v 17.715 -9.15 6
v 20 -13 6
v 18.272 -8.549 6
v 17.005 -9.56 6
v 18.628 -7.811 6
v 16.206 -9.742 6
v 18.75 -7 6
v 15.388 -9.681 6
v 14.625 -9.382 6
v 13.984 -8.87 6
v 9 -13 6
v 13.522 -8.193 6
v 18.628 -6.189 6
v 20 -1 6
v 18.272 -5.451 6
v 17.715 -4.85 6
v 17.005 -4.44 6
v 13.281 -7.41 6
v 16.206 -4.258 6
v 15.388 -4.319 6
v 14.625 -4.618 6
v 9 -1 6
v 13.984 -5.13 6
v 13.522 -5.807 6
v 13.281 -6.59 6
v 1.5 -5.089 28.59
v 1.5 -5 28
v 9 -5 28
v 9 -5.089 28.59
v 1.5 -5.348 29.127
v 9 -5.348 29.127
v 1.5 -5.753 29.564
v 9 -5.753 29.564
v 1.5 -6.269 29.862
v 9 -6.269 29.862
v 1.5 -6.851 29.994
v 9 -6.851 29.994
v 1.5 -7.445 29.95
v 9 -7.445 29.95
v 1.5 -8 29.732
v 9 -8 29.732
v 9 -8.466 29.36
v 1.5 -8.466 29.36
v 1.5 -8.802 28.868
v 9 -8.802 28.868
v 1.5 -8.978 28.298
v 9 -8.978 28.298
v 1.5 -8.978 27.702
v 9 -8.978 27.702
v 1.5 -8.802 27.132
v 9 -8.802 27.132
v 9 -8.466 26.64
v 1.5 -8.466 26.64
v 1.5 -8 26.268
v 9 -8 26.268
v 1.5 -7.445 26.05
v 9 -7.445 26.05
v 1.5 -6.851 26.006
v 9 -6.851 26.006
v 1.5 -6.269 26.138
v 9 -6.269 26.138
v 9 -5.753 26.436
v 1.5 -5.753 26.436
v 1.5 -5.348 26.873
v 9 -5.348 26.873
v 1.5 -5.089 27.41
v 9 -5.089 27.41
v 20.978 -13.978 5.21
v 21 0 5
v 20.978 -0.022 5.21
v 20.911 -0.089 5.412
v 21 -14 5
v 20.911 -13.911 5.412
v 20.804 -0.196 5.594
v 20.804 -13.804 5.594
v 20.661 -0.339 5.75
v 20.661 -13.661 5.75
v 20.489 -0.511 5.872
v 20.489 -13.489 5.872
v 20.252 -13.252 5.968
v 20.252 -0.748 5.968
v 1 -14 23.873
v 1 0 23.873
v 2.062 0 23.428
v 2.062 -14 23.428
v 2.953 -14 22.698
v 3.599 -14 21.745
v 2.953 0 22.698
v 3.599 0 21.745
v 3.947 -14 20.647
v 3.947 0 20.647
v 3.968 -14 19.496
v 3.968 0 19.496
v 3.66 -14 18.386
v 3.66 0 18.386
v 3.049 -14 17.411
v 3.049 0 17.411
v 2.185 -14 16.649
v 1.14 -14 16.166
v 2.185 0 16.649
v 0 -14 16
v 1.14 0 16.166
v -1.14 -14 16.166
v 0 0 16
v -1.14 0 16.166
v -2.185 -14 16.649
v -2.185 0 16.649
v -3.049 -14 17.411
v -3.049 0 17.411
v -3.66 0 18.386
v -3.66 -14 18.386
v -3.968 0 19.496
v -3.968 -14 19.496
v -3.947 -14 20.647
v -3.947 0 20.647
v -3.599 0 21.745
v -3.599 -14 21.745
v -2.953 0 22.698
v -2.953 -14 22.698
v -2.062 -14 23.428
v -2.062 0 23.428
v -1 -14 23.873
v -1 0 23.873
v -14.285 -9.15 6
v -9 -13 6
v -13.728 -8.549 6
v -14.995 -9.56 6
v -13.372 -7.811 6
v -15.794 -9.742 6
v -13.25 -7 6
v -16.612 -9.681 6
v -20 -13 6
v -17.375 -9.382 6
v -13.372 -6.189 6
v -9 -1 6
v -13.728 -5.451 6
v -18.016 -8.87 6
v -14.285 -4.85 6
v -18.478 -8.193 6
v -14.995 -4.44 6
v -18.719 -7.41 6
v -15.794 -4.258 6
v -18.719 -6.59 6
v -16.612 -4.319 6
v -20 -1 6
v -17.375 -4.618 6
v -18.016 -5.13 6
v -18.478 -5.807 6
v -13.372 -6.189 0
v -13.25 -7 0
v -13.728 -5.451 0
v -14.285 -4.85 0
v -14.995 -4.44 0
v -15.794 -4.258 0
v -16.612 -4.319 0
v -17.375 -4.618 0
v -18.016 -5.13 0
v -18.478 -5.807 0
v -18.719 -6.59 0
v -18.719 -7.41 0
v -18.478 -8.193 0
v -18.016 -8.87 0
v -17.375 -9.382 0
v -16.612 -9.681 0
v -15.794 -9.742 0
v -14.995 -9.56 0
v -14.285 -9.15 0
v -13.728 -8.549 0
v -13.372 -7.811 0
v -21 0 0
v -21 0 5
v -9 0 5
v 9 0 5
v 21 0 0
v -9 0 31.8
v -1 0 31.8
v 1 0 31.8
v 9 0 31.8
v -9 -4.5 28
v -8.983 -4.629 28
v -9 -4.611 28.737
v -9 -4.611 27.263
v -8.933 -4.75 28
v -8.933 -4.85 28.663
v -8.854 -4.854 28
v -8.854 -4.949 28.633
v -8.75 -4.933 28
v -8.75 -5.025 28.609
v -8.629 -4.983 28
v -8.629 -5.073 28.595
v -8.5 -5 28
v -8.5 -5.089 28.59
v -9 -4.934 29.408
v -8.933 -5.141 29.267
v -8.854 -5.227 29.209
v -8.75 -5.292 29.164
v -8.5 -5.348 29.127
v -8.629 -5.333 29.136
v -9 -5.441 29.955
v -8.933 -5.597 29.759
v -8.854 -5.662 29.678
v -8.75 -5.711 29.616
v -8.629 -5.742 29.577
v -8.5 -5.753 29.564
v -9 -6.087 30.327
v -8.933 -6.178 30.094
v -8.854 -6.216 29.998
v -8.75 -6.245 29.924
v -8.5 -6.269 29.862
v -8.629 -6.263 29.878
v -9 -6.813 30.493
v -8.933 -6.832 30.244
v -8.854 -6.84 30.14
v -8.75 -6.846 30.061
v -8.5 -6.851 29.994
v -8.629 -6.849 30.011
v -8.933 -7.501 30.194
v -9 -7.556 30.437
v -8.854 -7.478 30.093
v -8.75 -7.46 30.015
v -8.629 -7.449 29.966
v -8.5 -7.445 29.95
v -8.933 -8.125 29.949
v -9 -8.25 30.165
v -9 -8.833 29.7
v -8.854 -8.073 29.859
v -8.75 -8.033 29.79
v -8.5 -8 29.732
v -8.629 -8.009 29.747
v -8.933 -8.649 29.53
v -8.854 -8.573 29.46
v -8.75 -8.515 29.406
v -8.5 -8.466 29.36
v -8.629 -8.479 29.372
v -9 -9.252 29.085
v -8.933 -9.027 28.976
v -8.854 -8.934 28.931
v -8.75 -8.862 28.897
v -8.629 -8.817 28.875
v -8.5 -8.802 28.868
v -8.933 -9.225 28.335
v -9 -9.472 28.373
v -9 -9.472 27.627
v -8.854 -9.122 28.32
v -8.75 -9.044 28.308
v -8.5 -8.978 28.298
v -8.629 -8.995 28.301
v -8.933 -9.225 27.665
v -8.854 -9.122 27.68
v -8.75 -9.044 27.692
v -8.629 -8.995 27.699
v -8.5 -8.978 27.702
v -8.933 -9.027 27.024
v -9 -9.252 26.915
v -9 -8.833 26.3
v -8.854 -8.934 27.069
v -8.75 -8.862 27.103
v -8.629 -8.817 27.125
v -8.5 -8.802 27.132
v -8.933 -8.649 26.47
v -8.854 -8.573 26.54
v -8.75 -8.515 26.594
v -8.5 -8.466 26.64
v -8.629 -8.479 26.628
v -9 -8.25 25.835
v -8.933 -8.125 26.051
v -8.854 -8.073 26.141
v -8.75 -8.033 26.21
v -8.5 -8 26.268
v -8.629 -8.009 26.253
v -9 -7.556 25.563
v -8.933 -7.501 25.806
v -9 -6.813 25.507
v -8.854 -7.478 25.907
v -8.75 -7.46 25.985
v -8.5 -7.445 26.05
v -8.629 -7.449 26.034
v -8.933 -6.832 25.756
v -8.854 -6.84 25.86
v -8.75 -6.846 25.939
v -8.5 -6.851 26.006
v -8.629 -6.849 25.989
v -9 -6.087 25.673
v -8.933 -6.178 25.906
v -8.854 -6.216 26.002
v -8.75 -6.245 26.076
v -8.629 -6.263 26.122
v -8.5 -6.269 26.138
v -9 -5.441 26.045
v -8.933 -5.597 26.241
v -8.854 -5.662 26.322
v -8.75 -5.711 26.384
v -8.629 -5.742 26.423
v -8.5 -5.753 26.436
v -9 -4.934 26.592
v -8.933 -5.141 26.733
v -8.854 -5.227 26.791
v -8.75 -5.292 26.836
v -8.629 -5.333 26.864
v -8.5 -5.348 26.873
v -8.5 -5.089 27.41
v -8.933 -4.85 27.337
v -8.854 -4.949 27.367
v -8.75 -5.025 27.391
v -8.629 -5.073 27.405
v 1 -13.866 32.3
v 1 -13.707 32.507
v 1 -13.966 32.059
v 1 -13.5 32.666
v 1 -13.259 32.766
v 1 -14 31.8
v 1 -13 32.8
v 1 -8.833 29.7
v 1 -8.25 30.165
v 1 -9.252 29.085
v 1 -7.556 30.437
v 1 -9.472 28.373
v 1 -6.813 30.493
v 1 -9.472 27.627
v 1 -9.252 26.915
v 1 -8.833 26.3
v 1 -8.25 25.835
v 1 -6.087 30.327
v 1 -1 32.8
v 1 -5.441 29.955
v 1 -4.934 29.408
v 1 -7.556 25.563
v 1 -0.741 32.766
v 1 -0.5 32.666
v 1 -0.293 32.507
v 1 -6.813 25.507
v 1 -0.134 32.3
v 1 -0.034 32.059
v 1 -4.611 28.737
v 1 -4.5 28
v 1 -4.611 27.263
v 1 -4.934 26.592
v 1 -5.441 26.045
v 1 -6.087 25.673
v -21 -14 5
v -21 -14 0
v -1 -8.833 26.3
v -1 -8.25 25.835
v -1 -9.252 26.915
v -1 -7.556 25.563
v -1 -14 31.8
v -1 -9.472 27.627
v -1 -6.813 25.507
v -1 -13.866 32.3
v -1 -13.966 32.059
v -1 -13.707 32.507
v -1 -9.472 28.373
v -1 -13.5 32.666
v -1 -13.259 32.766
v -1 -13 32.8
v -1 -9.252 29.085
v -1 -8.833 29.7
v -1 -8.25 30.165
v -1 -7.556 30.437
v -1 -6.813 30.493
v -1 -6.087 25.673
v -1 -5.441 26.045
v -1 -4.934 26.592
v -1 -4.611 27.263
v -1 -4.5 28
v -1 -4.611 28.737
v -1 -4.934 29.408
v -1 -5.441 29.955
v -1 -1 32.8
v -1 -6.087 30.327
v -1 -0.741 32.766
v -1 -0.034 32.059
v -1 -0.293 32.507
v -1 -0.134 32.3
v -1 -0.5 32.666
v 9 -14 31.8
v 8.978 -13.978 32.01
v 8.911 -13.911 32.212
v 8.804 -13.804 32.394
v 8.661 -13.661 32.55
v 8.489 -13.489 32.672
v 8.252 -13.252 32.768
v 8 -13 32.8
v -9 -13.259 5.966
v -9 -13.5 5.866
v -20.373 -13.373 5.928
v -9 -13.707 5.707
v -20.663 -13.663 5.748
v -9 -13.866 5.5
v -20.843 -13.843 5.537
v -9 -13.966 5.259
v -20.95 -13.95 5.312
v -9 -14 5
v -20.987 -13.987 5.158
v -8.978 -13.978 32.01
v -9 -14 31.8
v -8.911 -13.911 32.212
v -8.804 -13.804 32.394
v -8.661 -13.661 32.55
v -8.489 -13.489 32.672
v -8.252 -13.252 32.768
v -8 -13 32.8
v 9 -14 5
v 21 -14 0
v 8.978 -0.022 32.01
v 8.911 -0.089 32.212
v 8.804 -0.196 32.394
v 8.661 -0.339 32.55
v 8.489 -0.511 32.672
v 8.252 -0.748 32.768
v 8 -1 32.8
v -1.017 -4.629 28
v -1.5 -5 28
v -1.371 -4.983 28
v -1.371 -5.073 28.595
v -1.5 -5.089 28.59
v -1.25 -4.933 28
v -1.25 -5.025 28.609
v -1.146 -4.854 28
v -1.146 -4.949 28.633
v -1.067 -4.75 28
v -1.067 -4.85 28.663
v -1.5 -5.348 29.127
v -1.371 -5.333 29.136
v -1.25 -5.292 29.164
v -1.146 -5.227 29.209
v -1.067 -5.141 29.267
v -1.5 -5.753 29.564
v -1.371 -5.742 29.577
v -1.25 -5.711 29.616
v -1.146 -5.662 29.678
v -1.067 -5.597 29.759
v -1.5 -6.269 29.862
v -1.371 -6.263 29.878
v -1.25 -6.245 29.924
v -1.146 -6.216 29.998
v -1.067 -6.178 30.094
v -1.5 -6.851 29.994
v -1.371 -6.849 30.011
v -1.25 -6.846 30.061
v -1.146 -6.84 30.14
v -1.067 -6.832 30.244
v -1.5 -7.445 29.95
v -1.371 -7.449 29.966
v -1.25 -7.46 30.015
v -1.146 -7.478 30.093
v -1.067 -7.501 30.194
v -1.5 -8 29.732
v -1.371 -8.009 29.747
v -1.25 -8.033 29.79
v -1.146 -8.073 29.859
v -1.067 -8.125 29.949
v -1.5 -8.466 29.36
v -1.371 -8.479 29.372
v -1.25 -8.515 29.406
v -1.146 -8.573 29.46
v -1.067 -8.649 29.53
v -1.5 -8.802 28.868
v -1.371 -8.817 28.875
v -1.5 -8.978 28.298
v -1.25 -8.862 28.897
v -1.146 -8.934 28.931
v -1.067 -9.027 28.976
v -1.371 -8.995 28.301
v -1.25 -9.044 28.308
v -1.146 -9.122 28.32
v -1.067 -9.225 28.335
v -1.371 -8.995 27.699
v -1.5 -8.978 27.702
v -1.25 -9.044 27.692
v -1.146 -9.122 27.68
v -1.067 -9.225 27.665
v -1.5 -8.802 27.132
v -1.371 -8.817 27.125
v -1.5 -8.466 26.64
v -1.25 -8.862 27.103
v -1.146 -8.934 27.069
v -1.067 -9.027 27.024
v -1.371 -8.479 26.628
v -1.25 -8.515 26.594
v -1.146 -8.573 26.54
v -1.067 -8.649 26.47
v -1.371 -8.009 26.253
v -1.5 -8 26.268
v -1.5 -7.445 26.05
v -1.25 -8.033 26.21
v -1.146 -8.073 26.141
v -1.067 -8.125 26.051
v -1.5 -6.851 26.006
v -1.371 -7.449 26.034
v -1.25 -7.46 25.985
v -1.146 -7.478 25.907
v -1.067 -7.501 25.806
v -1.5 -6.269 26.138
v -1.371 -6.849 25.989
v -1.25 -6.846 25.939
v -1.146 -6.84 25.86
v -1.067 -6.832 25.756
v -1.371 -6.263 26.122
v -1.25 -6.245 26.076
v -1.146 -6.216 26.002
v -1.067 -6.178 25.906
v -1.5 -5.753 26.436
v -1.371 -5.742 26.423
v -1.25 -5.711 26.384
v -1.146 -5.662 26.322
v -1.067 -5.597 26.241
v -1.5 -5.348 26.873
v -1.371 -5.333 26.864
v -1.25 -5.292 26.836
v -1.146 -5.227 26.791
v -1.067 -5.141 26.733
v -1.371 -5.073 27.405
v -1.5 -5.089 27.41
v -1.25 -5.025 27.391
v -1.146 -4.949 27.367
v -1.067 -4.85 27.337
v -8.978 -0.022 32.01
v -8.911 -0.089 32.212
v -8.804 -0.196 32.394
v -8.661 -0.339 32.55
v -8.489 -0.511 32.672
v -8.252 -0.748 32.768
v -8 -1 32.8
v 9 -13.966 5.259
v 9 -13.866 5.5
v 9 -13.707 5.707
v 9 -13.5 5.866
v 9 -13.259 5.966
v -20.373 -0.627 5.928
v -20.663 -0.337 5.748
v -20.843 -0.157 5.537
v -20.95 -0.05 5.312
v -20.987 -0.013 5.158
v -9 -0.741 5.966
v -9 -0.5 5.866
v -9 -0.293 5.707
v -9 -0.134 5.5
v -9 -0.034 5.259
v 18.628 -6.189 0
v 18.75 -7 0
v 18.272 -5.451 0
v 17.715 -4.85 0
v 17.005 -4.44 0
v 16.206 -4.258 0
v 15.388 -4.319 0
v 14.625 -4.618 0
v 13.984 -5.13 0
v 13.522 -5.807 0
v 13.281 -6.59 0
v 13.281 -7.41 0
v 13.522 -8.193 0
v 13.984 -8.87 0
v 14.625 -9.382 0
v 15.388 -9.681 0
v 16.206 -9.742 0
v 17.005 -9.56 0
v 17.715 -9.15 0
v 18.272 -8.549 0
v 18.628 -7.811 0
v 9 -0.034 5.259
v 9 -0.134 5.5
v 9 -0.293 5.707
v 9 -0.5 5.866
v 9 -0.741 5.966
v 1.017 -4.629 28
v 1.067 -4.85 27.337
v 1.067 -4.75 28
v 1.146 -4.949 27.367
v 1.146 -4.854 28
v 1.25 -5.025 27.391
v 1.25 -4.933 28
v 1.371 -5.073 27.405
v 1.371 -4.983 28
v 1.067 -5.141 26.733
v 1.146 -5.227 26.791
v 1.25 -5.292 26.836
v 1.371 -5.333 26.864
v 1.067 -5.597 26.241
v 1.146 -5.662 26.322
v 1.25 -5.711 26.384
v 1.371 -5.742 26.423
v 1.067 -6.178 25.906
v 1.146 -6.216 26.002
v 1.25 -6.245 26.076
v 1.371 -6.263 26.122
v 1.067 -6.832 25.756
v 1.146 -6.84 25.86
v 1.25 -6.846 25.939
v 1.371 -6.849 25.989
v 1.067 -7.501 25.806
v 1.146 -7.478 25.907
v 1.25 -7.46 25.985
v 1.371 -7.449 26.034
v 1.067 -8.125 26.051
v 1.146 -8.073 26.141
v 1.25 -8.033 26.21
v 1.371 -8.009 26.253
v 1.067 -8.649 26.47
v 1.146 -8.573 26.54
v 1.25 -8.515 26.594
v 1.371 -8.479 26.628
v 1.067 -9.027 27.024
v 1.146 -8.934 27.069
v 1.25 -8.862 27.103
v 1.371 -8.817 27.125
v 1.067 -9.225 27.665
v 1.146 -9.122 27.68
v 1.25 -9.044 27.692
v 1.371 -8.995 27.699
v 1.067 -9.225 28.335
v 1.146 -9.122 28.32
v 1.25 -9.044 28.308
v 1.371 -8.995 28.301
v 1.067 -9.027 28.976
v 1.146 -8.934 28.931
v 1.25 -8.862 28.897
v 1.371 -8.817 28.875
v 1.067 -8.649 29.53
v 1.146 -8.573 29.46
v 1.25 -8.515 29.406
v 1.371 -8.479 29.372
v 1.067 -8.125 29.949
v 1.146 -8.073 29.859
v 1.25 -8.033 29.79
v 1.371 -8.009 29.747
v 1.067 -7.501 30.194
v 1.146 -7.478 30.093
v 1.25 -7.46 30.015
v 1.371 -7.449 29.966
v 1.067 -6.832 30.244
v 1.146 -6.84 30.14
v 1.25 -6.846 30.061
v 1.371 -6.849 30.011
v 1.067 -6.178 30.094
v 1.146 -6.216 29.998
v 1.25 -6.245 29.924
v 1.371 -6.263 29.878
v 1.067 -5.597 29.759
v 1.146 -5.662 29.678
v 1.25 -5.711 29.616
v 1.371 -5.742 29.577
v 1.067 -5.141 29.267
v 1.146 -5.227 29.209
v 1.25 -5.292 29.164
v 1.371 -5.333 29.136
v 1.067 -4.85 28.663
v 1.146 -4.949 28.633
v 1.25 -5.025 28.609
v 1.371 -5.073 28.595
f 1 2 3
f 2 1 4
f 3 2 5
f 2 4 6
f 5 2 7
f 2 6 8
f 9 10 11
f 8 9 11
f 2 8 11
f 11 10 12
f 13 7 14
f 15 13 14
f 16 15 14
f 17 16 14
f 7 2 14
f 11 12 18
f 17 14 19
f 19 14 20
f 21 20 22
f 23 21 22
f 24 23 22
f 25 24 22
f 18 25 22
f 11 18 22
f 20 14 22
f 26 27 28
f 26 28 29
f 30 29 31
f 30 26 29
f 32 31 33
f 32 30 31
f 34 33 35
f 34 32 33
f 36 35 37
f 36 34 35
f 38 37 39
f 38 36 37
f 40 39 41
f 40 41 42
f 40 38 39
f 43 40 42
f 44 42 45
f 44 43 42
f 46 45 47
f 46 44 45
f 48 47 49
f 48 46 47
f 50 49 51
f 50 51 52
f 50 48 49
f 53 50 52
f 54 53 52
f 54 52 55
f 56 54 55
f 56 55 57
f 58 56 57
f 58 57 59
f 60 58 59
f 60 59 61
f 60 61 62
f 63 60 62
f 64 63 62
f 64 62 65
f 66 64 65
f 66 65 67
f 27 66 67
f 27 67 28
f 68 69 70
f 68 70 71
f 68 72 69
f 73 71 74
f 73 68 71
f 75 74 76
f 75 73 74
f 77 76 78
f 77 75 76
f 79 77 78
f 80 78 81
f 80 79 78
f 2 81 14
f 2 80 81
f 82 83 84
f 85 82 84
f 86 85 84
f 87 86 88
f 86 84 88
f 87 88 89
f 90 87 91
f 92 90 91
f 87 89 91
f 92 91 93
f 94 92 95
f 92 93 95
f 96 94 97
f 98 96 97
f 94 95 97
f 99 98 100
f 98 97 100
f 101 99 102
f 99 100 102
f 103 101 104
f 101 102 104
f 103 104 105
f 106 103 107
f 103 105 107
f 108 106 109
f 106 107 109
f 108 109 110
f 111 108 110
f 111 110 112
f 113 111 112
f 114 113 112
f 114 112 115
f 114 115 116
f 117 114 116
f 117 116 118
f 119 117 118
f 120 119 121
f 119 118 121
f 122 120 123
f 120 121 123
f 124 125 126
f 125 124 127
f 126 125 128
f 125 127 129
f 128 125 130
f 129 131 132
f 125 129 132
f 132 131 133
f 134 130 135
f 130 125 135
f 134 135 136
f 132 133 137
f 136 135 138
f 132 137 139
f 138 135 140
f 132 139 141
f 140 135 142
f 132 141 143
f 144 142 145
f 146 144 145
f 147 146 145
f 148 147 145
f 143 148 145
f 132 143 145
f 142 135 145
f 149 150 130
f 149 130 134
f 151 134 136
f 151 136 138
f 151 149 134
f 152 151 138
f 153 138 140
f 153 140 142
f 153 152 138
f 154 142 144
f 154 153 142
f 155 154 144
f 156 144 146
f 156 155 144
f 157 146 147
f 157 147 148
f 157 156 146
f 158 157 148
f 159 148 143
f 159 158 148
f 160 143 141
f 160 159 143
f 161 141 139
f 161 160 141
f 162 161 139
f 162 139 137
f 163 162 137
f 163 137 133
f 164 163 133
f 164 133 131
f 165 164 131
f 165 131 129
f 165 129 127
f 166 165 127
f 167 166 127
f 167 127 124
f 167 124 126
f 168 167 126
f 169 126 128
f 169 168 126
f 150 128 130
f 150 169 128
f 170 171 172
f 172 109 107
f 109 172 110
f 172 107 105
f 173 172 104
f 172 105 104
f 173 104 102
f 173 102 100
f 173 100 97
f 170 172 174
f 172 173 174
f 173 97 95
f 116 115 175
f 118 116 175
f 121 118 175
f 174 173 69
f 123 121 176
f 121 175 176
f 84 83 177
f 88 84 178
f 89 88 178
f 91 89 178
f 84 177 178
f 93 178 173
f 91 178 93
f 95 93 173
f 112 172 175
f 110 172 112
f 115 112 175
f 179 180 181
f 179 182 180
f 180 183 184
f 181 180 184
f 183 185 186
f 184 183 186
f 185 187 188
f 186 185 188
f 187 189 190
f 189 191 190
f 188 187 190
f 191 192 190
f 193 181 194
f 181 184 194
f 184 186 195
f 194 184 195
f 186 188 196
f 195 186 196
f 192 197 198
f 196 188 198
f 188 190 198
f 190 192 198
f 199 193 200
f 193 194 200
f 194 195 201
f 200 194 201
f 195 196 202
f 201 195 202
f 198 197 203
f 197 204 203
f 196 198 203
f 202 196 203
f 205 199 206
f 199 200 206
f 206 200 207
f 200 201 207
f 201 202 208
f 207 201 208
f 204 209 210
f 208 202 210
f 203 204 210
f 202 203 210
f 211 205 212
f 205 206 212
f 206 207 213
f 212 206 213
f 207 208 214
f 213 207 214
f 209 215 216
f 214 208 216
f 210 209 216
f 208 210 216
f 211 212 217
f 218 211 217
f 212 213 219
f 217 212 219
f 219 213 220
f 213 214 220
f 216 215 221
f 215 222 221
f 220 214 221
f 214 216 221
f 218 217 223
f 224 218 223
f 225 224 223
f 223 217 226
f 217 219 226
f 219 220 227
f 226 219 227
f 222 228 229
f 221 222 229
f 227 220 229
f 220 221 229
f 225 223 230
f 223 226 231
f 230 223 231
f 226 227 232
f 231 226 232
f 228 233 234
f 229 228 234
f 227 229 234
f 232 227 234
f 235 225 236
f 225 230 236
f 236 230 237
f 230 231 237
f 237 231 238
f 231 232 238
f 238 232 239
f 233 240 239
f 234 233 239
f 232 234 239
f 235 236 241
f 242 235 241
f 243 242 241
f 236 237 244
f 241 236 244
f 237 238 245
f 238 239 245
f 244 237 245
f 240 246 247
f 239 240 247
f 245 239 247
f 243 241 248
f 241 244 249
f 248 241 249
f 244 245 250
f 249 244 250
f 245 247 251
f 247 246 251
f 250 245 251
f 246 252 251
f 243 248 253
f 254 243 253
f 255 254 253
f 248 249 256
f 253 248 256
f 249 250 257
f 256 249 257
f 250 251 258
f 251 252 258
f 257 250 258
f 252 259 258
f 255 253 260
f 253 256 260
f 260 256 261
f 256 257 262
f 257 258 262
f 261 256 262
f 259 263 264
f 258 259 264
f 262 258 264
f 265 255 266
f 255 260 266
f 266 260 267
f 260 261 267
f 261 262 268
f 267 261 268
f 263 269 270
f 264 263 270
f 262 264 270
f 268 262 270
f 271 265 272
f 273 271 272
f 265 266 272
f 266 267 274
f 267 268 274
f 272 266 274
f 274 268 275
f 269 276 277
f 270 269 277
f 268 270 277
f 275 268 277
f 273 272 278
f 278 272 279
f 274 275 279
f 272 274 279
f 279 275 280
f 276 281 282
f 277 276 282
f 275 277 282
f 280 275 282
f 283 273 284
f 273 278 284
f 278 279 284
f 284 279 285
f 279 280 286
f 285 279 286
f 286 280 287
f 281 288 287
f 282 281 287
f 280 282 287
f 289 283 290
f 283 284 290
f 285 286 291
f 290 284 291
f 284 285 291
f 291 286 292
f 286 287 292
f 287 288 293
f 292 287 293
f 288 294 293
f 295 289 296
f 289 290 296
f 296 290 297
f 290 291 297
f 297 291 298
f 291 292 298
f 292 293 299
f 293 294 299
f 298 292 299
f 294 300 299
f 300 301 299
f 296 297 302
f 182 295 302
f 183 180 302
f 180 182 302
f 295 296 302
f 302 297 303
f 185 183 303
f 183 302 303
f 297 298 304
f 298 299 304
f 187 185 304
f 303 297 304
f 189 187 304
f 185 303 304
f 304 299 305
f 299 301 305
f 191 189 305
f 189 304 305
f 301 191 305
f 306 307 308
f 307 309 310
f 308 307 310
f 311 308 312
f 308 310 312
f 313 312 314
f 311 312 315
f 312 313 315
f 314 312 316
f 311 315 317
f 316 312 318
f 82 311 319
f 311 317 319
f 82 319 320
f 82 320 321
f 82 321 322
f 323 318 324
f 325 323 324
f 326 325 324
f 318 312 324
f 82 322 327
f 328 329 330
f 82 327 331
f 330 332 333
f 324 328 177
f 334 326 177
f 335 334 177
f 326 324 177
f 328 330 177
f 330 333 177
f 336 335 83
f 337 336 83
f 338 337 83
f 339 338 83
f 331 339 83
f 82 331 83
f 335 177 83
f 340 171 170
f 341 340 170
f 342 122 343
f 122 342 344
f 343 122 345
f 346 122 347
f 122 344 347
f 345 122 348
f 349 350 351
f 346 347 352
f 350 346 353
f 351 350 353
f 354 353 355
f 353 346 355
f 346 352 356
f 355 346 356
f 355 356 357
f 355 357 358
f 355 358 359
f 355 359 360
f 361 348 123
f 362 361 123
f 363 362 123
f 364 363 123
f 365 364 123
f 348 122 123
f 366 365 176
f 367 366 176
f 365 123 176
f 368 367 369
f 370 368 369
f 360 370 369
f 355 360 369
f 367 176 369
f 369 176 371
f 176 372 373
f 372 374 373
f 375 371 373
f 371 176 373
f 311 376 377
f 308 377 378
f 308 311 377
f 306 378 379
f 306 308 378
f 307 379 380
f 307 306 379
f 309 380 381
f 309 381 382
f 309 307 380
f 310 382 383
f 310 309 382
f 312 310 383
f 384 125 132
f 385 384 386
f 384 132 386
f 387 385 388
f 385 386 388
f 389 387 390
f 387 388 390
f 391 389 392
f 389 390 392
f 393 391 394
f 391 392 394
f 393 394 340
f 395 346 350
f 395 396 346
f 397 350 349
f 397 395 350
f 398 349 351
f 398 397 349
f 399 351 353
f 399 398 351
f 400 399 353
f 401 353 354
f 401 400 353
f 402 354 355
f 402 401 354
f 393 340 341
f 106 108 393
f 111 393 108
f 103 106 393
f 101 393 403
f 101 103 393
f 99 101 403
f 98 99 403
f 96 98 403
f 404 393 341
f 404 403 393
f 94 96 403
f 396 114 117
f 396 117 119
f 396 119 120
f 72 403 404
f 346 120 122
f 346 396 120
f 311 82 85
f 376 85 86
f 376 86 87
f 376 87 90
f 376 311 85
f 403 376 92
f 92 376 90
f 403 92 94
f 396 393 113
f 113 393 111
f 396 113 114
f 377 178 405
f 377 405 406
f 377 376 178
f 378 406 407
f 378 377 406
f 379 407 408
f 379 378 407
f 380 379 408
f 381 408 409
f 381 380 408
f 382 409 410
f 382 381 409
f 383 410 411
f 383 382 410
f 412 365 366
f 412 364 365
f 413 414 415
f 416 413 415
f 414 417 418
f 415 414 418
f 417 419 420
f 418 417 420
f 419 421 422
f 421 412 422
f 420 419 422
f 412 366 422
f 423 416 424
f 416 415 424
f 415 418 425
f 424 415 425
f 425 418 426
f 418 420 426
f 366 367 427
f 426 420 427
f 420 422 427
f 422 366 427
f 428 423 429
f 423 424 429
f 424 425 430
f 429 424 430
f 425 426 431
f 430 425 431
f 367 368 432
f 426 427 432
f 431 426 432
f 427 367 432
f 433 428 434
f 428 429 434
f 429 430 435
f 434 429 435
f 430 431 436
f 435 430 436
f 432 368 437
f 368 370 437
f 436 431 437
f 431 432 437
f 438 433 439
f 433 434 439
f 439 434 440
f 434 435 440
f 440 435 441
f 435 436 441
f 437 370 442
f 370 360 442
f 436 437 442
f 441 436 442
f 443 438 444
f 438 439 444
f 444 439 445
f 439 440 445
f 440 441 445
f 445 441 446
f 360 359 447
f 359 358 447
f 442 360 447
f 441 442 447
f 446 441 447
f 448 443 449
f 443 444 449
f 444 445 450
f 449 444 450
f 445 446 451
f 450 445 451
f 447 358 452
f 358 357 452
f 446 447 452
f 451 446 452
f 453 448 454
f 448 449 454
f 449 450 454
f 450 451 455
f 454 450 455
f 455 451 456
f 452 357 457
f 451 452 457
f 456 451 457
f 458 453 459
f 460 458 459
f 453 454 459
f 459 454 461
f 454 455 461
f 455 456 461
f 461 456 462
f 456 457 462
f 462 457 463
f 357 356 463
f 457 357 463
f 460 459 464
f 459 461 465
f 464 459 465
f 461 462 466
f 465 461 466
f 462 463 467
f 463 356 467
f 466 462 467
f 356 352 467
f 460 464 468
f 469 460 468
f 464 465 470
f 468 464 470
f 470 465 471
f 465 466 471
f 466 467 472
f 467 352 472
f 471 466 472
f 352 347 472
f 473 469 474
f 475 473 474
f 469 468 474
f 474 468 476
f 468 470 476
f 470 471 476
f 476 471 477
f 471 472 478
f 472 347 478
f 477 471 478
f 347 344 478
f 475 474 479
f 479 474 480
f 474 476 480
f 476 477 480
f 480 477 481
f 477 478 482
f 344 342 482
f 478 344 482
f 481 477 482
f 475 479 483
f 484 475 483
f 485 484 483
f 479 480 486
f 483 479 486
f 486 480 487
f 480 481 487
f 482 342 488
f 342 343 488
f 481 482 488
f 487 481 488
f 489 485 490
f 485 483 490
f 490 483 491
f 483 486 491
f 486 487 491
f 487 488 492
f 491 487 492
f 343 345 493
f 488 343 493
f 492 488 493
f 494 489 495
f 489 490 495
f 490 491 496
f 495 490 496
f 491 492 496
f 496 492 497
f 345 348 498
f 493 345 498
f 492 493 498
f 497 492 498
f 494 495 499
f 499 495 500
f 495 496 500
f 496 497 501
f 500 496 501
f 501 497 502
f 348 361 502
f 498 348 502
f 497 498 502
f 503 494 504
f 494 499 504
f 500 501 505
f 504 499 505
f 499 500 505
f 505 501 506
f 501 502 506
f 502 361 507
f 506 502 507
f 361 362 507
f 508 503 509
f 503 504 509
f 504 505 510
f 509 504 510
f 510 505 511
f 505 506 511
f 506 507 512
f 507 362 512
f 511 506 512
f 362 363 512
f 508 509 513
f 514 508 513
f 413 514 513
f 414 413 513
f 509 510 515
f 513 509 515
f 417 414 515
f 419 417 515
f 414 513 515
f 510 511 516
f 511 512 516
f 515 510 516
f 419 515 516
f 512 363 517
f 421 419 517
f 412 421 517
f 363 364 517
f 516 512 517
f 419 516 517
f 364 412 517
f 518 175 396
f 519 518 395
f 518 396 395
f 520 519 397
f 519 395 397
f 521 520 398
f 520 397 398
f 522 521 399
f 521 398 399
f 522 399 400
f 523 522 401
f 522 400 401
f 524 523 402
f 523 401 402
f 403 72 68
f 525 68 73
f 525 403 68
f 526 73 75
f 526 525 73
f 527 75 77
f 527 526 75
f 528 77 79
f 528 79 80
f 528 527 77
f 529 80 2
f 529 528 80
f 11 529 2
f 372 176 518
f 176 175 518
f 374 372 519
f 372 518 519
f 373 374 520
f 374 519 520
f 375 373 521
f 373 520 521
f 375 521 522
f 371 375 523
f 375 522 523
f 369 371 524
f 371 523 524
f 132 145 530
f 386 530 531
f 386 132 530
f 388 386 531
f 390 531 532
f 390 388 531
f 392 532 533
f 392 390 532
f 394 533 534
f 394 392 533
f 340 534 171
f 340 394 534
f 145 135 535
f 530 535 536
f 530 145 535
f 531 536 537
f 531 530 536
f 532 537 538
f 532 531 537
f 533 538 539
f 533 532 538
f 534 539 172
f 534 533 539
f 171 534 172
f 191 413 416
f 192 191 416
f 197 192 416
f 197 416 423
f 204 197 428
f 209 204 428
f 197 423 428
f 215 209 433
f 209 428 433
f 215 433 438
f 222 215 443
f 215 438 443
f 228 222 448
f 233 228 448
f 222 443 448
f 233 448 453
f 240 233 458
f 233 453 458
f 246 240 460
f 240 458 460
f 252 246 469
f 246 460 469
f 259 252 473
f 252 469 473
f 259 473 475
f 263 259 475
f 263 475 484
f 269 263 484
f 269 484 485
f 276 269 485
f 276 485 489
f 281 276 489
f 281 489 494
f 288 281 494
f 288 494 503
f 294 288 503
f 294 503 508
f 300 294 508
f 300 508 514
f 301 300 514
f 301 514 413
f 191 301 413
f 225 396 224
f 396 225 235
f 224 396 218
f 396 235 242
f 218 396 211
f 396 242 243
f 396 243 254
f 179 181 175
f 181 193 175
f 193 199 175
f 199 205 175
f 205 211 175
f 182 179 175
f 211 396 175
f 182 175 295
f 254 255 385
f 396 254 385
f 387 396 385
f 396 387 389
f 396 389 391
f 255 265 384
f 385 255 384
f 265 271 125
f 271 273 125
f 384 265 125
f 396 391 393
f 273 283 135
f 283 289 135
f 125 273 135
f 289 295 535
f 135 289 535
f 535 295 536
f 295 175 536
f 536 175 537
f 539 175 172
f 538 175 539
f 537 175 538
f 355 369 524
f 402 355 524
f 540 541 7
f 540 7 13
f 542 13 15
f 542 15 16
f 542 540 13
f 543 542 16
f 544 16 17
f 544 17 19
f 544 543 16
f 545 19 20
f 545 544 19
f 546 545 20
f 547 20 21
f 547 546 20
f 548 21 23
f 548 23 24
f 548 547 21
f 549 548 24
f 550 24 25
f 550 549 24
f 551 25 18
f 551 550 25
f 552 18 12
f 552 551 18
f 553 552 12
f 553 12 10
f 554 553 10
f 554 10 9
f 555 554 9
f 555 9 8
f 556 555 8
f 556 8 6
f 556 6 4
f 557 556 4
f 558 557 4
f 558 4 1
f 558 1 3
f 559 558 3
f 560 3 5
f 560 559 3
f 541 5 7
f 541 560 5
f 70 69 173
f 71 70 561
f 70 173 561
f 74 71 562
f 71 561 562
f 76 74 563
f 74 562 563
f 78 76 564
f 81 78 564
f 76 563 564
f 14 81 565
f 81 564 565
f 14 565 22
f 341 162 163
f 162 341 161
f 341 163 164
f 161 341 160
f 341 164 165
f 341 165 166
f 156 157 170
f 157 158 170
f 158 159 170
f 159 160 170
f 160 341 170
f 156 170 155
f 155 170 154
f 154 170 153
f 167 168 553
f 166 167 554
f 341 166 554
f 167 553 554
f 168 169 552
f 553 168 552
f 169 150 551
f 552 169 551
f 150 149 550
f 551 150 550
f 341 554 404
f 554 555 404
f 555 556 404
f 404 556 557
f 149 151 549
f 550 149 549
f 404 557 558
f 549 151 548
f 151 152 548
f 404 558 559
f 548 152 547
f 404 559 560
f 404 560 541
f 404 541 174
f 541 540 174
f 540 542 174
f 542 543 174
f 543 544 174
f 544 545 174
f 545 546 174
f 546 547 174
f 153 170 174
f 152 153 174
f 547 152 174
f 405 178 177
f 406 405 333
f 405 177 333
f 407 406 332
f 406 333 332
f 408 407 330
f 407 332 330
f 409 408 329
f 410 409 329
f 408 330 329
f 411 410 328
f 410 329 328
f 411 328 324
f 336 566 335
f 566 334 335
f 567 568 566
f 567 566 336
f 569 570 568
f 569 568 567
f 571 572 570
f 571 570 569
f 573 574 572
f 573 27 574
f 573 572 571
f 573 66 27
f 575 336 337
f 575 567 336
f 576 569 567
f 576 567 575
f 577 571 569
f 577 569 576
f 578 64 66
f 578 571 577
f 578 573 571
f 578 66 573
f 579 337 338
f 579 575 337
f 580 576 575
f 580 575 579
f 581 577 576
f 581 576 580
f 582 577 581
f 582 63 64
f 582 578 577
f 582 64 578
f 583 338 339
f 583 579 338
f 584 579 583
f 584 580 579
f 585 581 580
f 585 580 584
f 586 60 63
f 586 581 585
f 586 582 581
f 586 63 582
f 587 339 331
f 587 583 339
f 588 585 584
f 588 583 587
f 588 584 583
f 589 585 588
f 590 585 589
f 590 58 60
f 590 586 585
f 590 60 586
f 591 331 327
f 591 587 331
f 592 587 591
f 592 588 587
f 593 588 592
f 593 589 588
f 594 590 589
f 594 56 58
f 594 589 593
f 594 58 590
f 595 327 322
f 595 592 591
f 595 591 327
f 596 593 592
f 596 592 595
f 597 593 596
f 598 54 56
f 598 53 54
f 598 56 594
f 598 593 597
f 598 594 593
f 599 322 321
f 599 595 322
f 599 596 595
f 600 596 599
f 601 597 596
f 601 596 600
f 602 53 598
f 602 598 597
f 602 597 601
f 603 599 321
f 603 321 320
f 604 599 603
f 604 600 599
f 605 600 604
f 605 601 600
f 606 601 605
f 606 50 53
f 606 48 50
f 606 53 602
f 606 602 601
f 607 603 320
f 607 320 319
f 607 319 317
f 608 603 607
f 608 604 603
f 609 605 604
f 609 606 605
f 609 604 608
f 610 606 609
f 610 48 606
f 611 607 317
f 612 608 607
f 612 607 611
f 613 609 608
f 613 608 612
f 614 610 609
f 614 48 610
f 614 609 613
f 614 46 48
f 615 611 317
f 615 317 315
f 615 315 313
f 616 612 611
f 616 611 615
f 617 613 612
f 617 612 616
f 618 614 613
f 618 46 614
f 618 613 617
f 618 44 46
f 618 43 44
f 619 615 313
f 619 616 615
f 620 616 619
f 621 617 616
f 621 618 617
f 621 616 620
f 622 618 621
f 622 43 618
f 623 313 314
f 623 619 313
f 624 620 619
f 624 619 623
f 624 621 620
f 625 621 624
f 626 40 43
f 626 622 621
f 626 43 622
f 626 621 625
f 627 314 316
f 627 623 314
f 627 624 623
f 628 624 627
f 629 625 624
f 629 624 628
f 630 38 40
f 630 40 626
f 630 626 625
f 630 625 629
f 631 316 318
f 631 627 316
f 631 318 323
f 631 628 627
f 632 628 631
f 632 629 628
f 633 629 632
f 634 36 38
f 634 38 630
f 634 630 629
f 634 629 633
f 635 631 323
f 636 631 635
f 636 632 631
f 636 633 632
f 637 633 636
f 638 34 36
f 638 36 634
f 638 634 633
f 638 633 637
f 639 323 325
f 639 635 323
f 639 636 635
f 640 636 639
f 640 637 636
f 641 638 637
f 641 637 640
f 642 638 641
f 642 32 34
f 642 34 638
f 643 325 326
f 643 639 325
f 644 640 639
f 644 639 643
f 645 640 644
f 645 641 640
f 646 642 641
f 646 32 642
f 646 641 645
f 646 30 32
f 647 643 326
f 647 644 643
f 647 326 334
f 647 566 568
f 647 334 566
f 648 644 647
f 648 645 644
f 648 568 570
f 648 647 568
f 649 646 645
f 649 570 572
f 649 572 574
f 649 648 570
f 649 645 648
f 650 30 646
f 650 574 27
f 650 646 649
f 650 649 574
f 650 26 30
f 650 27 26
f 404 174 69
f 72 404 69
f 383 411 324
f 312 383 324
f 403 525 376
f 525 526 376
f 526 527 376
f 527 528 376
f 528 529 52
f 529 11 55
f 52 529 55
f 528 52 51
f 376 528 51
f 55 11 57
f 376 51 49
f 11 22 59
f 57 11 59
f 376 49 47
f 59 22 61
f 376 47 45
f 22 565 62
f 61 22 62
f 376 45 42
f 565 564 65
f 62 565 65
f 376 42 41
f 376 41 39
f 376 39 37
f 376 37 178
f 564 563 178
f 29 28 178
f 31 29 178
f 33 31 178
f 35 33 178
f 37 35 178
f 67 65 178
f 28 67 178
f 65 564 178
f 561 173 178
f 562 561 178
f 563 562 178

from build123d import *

# Parameters (mm, degrees)
F1_DEPTH      = 14
F2_R          = 2.75
F3_DEPTH      = 6
F4_R          = 1
F5_R          = 2
F6_DEPTH      = 10
F6_DEPTH_BACK = 9
F7_R          = 0.5


with BuildPart() as f1:
    # F0 (on Front) → F1 (new body)
    with BuildSketch(Plane.XZ):
        with BuildLine():
            Line((-9, 6), (-21, 6))
            Line((-21, 6), (-21, 0))
            Line((-21, 0), (21, 0))
            Line((21, 0), (21, 6))
            Line((21, 6), (9, 6))
            Line((9, 6), (9, 32.8))
            Line((9, 32.8), (1, 32.8))
            Line((1, 32.8), (1, 23.8729833462))
            ThreePointArc((1, 23.8729833462), (0, 16), (-1, 23.8729833462))
            Line((-1, 23.8729833462), (-1, 32.8))
            Line((-1, 32.8), (-9, 32.8))
            Line((-9, 32.8), (-9, 6))
        make_face()
    extrude(amount=F1_DEPTH)

    # F2 (on Top) → F3 (cut)
    with BuildSketch(Plane.XY):
        with Locations((16, -7)):
            Circle(F2_R)
        with Locations((-16, -7)):
            Circle(F2_R)
    extrude(amount=F3_DEPTH, mode=Mode.SUBTRACT)

    # F4
    f4_edges = [f1.edges().sort_by_distance(p)[0] for p in [
        (-21, -7, 6),
        (-15, 0, 6),
        (-15, -14, 6),
        (15, -14, 6),
        (21, -7, 6),
        (15, 0, 6),
        (-9, -7, 32.8),
        (9, -7, 32.8),
        (5, 0, 32.8),
        (-5, 0, 32.8),
        (-5, -14, 32.8),
        (5, -14, 32.8),
    ]]
    fillet(f4_edges, radius=F4_R)

    # F5 (on Right) → F6 (cut, two sides)
    with BuildSketch(Plane.YZ) as f6_sk:
        with Locations((-7, 28)):
            Circle(F5_R)
    extrude(amount=-F6_DEPTH, mode=Mode.SUBTRACT)
    extrude(f6_sk.sketch, amount=F6_DEPTH_BACK, mode=Mode.SUBTRACT)

    # F7
    f7_edges = [f1.edges().sort_by_distance(p)[0] for p in [
        (1, -9, 28),
        (-9, -9, 28),
        (-1, -9, 28),
    ]]
    fillet(f7_edges, radius=F7_R)


solid = f1.part
